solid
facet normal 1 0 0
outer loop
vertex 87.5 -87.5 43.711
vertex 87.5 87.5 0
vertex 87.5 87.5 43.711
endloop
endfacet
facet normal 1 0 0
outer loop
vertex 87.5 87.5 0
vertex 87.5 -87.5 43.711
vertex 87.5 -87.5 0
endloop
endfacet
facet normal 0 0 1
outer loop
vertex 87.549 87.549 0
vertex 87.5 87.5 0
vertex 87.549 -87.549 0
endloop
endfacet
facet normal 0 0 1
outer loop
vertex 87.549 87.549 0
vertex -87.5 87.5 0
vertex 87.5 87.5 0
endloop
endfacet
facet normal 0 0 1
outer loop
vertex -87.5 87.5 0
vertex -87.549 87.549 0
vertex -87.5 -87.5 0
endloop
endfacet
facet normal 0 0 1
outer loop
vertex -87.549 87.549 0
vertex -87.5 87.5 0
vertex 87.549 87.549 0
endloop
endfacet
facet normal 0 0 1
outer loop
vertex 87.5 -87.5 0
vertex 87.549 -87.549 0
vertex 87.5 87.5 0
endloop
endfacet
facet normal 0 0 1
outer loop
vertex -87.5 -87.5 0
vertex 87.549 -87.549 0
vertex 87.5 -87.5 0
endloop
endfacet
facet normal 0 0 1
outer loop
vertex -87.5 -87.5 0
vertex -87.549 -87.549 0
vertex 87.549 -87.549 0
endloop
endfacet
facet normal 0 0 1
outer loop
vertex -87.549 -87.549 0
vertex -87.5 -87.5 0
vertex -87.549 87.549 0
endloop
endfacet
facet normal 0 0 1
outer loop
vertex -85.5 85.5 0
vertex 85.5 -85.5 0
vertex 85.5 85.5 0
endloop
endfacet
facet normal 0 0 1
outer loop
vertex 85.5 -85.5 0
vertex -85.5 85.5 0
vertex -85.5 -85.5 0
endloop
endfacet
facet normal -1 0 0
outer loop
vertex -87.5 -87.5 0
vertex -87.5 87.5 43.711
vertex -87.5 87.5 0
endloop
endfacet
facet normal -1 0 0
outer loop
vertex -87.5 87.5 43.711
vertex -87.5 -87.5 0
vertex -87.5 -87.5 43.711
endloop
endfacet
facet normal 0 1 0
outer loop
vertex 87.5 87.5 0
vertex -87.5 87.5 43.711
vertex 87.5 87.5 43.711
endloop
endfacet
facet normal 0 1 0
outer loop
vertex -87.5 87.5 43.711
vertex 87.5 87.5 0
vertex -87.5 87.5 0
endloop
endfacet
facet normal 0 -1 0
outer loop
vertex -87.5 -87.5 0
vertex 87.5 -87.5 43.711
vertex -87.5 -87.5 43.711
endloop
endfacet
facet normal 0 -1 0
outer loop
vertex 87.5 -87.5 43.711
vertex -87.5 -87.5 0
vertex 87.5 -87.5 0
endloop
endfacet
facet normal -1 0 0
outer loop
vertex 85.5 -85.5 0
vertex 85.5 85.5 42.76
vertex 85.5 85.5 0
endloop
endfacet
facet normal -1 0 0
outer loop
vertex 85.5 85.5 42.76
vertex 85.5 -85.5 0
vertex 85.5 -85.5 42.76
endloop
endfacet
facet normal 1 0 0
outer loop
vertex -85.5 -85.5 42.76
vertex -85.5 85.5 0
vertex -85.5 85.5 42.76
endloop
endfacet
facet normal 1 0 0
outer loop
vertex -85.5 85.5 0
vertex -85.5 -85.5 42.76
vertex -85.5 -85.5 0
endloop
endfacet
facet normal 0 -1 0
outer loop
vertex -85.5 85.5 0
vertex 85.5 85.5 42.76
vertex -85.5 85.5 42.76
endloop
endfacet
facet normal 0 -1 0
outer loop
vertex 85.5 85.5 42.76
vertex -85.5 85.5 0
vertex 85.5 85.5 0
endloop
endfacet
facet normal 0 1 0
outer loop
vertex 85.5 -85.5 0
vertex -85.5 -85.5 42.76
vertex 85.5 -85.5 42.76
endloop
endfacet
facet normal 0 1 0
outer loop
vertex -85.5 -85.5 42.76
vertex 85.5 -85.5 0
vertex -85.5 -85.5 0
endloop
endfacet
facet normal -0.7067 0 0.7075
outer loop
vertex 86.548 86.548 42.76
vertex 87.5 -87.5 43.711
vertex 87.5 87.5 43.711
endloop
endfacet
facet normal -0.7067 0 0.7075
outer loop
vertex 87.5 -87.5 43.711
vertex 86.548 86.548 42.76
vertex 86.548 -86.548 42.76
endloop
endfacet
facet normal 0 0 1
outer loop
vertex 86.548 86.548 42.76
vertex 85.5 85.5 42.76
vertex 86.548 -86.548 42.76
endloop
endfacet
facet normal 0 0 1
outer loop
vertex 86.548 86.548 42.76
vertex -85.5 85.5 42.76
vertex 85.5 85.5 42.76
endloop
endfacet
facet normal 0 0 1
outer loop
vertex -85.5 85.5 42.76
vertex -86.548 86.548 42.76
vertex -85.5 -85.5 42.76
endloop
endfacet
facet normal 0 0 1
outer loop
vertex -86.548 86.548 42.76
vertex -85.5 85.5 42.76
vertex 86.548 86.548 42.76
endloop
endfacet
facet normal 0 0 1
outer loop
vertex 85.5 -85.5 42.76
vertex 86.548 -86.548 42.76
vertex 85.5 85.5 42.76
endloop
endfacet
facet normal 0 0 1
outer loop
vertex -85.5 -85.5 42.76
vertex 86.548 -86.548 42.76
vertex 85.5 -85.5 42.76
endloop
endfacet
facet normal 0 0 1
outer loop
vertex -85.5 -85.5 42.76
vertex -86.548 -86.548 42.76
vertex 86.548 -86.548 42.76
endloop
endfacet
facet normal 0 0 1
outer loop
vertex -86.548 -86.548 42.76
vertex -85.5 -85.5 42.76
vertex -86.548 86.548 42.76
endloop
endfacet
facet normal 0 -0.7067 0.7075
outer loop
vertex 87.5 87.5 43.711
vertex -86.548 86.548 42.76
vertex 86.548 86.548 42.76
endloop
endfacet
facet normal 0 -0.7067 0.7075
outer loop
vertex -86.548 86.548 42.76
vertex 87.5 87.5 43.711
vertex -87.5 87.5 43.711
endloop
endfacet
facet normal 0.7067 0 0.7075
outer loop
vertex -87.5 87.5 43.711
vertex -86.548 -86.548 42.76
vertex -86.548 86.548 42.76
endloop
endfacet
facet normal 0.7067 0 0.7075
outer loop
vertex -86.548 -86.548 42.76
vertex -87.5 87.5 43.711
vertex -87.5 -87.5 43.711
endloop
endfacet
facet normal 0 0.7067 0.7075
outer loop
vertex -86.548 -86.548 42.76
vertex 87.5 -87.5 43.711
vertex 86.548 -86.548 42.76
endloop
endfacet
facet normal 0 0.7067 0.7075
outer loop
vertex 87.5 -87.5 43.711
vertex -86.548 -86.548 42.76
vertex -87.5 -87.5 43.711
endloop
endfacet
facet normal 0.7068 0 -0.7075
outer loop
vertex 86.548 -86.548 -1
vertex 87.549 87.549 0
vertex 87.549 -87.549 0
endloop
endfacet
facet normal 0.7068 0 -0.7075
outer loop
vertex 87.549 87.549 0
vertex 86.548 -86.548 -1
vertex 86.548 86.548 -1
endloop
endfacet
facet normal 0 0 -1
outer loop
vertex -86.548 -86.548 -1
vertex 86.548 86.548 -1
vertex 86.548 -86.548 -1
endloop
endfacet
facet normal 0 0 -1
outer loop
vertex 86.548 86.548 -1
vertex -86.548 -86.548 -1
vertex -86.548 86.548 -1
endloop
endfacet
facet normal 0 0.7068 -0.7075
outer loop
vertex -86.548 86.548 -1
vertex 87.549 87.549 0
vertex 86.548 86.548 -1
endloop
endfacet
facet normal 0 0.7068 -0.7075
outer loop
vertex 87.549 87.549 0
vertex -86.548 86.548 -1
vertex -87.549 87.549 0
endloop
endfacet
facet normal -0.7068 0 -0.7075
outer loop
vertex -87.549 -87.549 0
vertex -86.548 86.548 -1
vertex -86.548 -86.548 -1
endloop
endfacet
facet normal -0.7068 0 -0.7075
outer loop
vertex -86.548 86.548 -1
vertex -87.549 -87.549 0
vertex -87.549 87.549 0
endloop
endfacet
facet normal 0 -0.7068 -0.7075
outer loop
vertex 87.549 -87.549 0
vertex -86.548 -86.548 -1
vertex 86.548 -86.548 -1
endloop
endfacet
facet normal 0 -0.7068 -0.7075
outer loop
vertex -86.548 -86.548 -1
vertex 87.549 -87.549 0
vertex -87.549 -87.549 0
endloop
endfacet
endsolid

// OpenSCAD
// stackable/nestable trays
//
// github.com/pchuck/generative-3d-models
//
size = 175; // size of the tray in mm
wall = 2; // wall thickness in mm
height = 0.25; // height as a fraction of size
cutd = 1; // cutout depth
cutf = (size - 2) / size; // cutout factor
convexity = 10;
center = true;
sides = 4;
fudge = 1.01;
c = 1.415;
fn=10;

// rectangular frame
module frame(s, h, w) {
    translate([-s / 2, -s / 2, 0]) {
        difference() {
            cube([s, s, s * h]);
            translate([w, w, - fudge / 2])
                cube([s - w * 2, s - w * 2, s * h + fudge]);
        }
    }
}

// base (additive) or top cutout (subtractive)
module cutout() {
    rotate([180, 0, 0])
    rotate([0, 0, 45])
    linear_extrude(height=cutd, 
                   center=center, 
                   convexity=convexity, 
                   twist=0, 
                   scale=[cutf, cutf], 
                   $fn=fn)
        circle(d=size * c, $fn=sides);
}

// render

// tray with no cutouts or base
// tray(size, height, wall);

// tray with base and top cutout for stacking...
difference() {
    frame(size, height, wall);
    // top cutout
    translate([0, 0, size * height - cutd - cutd / 2 + fudge])
        cutout();
}
// bottom base
translate([0, 0, -cutd / 2])
    cutout();
